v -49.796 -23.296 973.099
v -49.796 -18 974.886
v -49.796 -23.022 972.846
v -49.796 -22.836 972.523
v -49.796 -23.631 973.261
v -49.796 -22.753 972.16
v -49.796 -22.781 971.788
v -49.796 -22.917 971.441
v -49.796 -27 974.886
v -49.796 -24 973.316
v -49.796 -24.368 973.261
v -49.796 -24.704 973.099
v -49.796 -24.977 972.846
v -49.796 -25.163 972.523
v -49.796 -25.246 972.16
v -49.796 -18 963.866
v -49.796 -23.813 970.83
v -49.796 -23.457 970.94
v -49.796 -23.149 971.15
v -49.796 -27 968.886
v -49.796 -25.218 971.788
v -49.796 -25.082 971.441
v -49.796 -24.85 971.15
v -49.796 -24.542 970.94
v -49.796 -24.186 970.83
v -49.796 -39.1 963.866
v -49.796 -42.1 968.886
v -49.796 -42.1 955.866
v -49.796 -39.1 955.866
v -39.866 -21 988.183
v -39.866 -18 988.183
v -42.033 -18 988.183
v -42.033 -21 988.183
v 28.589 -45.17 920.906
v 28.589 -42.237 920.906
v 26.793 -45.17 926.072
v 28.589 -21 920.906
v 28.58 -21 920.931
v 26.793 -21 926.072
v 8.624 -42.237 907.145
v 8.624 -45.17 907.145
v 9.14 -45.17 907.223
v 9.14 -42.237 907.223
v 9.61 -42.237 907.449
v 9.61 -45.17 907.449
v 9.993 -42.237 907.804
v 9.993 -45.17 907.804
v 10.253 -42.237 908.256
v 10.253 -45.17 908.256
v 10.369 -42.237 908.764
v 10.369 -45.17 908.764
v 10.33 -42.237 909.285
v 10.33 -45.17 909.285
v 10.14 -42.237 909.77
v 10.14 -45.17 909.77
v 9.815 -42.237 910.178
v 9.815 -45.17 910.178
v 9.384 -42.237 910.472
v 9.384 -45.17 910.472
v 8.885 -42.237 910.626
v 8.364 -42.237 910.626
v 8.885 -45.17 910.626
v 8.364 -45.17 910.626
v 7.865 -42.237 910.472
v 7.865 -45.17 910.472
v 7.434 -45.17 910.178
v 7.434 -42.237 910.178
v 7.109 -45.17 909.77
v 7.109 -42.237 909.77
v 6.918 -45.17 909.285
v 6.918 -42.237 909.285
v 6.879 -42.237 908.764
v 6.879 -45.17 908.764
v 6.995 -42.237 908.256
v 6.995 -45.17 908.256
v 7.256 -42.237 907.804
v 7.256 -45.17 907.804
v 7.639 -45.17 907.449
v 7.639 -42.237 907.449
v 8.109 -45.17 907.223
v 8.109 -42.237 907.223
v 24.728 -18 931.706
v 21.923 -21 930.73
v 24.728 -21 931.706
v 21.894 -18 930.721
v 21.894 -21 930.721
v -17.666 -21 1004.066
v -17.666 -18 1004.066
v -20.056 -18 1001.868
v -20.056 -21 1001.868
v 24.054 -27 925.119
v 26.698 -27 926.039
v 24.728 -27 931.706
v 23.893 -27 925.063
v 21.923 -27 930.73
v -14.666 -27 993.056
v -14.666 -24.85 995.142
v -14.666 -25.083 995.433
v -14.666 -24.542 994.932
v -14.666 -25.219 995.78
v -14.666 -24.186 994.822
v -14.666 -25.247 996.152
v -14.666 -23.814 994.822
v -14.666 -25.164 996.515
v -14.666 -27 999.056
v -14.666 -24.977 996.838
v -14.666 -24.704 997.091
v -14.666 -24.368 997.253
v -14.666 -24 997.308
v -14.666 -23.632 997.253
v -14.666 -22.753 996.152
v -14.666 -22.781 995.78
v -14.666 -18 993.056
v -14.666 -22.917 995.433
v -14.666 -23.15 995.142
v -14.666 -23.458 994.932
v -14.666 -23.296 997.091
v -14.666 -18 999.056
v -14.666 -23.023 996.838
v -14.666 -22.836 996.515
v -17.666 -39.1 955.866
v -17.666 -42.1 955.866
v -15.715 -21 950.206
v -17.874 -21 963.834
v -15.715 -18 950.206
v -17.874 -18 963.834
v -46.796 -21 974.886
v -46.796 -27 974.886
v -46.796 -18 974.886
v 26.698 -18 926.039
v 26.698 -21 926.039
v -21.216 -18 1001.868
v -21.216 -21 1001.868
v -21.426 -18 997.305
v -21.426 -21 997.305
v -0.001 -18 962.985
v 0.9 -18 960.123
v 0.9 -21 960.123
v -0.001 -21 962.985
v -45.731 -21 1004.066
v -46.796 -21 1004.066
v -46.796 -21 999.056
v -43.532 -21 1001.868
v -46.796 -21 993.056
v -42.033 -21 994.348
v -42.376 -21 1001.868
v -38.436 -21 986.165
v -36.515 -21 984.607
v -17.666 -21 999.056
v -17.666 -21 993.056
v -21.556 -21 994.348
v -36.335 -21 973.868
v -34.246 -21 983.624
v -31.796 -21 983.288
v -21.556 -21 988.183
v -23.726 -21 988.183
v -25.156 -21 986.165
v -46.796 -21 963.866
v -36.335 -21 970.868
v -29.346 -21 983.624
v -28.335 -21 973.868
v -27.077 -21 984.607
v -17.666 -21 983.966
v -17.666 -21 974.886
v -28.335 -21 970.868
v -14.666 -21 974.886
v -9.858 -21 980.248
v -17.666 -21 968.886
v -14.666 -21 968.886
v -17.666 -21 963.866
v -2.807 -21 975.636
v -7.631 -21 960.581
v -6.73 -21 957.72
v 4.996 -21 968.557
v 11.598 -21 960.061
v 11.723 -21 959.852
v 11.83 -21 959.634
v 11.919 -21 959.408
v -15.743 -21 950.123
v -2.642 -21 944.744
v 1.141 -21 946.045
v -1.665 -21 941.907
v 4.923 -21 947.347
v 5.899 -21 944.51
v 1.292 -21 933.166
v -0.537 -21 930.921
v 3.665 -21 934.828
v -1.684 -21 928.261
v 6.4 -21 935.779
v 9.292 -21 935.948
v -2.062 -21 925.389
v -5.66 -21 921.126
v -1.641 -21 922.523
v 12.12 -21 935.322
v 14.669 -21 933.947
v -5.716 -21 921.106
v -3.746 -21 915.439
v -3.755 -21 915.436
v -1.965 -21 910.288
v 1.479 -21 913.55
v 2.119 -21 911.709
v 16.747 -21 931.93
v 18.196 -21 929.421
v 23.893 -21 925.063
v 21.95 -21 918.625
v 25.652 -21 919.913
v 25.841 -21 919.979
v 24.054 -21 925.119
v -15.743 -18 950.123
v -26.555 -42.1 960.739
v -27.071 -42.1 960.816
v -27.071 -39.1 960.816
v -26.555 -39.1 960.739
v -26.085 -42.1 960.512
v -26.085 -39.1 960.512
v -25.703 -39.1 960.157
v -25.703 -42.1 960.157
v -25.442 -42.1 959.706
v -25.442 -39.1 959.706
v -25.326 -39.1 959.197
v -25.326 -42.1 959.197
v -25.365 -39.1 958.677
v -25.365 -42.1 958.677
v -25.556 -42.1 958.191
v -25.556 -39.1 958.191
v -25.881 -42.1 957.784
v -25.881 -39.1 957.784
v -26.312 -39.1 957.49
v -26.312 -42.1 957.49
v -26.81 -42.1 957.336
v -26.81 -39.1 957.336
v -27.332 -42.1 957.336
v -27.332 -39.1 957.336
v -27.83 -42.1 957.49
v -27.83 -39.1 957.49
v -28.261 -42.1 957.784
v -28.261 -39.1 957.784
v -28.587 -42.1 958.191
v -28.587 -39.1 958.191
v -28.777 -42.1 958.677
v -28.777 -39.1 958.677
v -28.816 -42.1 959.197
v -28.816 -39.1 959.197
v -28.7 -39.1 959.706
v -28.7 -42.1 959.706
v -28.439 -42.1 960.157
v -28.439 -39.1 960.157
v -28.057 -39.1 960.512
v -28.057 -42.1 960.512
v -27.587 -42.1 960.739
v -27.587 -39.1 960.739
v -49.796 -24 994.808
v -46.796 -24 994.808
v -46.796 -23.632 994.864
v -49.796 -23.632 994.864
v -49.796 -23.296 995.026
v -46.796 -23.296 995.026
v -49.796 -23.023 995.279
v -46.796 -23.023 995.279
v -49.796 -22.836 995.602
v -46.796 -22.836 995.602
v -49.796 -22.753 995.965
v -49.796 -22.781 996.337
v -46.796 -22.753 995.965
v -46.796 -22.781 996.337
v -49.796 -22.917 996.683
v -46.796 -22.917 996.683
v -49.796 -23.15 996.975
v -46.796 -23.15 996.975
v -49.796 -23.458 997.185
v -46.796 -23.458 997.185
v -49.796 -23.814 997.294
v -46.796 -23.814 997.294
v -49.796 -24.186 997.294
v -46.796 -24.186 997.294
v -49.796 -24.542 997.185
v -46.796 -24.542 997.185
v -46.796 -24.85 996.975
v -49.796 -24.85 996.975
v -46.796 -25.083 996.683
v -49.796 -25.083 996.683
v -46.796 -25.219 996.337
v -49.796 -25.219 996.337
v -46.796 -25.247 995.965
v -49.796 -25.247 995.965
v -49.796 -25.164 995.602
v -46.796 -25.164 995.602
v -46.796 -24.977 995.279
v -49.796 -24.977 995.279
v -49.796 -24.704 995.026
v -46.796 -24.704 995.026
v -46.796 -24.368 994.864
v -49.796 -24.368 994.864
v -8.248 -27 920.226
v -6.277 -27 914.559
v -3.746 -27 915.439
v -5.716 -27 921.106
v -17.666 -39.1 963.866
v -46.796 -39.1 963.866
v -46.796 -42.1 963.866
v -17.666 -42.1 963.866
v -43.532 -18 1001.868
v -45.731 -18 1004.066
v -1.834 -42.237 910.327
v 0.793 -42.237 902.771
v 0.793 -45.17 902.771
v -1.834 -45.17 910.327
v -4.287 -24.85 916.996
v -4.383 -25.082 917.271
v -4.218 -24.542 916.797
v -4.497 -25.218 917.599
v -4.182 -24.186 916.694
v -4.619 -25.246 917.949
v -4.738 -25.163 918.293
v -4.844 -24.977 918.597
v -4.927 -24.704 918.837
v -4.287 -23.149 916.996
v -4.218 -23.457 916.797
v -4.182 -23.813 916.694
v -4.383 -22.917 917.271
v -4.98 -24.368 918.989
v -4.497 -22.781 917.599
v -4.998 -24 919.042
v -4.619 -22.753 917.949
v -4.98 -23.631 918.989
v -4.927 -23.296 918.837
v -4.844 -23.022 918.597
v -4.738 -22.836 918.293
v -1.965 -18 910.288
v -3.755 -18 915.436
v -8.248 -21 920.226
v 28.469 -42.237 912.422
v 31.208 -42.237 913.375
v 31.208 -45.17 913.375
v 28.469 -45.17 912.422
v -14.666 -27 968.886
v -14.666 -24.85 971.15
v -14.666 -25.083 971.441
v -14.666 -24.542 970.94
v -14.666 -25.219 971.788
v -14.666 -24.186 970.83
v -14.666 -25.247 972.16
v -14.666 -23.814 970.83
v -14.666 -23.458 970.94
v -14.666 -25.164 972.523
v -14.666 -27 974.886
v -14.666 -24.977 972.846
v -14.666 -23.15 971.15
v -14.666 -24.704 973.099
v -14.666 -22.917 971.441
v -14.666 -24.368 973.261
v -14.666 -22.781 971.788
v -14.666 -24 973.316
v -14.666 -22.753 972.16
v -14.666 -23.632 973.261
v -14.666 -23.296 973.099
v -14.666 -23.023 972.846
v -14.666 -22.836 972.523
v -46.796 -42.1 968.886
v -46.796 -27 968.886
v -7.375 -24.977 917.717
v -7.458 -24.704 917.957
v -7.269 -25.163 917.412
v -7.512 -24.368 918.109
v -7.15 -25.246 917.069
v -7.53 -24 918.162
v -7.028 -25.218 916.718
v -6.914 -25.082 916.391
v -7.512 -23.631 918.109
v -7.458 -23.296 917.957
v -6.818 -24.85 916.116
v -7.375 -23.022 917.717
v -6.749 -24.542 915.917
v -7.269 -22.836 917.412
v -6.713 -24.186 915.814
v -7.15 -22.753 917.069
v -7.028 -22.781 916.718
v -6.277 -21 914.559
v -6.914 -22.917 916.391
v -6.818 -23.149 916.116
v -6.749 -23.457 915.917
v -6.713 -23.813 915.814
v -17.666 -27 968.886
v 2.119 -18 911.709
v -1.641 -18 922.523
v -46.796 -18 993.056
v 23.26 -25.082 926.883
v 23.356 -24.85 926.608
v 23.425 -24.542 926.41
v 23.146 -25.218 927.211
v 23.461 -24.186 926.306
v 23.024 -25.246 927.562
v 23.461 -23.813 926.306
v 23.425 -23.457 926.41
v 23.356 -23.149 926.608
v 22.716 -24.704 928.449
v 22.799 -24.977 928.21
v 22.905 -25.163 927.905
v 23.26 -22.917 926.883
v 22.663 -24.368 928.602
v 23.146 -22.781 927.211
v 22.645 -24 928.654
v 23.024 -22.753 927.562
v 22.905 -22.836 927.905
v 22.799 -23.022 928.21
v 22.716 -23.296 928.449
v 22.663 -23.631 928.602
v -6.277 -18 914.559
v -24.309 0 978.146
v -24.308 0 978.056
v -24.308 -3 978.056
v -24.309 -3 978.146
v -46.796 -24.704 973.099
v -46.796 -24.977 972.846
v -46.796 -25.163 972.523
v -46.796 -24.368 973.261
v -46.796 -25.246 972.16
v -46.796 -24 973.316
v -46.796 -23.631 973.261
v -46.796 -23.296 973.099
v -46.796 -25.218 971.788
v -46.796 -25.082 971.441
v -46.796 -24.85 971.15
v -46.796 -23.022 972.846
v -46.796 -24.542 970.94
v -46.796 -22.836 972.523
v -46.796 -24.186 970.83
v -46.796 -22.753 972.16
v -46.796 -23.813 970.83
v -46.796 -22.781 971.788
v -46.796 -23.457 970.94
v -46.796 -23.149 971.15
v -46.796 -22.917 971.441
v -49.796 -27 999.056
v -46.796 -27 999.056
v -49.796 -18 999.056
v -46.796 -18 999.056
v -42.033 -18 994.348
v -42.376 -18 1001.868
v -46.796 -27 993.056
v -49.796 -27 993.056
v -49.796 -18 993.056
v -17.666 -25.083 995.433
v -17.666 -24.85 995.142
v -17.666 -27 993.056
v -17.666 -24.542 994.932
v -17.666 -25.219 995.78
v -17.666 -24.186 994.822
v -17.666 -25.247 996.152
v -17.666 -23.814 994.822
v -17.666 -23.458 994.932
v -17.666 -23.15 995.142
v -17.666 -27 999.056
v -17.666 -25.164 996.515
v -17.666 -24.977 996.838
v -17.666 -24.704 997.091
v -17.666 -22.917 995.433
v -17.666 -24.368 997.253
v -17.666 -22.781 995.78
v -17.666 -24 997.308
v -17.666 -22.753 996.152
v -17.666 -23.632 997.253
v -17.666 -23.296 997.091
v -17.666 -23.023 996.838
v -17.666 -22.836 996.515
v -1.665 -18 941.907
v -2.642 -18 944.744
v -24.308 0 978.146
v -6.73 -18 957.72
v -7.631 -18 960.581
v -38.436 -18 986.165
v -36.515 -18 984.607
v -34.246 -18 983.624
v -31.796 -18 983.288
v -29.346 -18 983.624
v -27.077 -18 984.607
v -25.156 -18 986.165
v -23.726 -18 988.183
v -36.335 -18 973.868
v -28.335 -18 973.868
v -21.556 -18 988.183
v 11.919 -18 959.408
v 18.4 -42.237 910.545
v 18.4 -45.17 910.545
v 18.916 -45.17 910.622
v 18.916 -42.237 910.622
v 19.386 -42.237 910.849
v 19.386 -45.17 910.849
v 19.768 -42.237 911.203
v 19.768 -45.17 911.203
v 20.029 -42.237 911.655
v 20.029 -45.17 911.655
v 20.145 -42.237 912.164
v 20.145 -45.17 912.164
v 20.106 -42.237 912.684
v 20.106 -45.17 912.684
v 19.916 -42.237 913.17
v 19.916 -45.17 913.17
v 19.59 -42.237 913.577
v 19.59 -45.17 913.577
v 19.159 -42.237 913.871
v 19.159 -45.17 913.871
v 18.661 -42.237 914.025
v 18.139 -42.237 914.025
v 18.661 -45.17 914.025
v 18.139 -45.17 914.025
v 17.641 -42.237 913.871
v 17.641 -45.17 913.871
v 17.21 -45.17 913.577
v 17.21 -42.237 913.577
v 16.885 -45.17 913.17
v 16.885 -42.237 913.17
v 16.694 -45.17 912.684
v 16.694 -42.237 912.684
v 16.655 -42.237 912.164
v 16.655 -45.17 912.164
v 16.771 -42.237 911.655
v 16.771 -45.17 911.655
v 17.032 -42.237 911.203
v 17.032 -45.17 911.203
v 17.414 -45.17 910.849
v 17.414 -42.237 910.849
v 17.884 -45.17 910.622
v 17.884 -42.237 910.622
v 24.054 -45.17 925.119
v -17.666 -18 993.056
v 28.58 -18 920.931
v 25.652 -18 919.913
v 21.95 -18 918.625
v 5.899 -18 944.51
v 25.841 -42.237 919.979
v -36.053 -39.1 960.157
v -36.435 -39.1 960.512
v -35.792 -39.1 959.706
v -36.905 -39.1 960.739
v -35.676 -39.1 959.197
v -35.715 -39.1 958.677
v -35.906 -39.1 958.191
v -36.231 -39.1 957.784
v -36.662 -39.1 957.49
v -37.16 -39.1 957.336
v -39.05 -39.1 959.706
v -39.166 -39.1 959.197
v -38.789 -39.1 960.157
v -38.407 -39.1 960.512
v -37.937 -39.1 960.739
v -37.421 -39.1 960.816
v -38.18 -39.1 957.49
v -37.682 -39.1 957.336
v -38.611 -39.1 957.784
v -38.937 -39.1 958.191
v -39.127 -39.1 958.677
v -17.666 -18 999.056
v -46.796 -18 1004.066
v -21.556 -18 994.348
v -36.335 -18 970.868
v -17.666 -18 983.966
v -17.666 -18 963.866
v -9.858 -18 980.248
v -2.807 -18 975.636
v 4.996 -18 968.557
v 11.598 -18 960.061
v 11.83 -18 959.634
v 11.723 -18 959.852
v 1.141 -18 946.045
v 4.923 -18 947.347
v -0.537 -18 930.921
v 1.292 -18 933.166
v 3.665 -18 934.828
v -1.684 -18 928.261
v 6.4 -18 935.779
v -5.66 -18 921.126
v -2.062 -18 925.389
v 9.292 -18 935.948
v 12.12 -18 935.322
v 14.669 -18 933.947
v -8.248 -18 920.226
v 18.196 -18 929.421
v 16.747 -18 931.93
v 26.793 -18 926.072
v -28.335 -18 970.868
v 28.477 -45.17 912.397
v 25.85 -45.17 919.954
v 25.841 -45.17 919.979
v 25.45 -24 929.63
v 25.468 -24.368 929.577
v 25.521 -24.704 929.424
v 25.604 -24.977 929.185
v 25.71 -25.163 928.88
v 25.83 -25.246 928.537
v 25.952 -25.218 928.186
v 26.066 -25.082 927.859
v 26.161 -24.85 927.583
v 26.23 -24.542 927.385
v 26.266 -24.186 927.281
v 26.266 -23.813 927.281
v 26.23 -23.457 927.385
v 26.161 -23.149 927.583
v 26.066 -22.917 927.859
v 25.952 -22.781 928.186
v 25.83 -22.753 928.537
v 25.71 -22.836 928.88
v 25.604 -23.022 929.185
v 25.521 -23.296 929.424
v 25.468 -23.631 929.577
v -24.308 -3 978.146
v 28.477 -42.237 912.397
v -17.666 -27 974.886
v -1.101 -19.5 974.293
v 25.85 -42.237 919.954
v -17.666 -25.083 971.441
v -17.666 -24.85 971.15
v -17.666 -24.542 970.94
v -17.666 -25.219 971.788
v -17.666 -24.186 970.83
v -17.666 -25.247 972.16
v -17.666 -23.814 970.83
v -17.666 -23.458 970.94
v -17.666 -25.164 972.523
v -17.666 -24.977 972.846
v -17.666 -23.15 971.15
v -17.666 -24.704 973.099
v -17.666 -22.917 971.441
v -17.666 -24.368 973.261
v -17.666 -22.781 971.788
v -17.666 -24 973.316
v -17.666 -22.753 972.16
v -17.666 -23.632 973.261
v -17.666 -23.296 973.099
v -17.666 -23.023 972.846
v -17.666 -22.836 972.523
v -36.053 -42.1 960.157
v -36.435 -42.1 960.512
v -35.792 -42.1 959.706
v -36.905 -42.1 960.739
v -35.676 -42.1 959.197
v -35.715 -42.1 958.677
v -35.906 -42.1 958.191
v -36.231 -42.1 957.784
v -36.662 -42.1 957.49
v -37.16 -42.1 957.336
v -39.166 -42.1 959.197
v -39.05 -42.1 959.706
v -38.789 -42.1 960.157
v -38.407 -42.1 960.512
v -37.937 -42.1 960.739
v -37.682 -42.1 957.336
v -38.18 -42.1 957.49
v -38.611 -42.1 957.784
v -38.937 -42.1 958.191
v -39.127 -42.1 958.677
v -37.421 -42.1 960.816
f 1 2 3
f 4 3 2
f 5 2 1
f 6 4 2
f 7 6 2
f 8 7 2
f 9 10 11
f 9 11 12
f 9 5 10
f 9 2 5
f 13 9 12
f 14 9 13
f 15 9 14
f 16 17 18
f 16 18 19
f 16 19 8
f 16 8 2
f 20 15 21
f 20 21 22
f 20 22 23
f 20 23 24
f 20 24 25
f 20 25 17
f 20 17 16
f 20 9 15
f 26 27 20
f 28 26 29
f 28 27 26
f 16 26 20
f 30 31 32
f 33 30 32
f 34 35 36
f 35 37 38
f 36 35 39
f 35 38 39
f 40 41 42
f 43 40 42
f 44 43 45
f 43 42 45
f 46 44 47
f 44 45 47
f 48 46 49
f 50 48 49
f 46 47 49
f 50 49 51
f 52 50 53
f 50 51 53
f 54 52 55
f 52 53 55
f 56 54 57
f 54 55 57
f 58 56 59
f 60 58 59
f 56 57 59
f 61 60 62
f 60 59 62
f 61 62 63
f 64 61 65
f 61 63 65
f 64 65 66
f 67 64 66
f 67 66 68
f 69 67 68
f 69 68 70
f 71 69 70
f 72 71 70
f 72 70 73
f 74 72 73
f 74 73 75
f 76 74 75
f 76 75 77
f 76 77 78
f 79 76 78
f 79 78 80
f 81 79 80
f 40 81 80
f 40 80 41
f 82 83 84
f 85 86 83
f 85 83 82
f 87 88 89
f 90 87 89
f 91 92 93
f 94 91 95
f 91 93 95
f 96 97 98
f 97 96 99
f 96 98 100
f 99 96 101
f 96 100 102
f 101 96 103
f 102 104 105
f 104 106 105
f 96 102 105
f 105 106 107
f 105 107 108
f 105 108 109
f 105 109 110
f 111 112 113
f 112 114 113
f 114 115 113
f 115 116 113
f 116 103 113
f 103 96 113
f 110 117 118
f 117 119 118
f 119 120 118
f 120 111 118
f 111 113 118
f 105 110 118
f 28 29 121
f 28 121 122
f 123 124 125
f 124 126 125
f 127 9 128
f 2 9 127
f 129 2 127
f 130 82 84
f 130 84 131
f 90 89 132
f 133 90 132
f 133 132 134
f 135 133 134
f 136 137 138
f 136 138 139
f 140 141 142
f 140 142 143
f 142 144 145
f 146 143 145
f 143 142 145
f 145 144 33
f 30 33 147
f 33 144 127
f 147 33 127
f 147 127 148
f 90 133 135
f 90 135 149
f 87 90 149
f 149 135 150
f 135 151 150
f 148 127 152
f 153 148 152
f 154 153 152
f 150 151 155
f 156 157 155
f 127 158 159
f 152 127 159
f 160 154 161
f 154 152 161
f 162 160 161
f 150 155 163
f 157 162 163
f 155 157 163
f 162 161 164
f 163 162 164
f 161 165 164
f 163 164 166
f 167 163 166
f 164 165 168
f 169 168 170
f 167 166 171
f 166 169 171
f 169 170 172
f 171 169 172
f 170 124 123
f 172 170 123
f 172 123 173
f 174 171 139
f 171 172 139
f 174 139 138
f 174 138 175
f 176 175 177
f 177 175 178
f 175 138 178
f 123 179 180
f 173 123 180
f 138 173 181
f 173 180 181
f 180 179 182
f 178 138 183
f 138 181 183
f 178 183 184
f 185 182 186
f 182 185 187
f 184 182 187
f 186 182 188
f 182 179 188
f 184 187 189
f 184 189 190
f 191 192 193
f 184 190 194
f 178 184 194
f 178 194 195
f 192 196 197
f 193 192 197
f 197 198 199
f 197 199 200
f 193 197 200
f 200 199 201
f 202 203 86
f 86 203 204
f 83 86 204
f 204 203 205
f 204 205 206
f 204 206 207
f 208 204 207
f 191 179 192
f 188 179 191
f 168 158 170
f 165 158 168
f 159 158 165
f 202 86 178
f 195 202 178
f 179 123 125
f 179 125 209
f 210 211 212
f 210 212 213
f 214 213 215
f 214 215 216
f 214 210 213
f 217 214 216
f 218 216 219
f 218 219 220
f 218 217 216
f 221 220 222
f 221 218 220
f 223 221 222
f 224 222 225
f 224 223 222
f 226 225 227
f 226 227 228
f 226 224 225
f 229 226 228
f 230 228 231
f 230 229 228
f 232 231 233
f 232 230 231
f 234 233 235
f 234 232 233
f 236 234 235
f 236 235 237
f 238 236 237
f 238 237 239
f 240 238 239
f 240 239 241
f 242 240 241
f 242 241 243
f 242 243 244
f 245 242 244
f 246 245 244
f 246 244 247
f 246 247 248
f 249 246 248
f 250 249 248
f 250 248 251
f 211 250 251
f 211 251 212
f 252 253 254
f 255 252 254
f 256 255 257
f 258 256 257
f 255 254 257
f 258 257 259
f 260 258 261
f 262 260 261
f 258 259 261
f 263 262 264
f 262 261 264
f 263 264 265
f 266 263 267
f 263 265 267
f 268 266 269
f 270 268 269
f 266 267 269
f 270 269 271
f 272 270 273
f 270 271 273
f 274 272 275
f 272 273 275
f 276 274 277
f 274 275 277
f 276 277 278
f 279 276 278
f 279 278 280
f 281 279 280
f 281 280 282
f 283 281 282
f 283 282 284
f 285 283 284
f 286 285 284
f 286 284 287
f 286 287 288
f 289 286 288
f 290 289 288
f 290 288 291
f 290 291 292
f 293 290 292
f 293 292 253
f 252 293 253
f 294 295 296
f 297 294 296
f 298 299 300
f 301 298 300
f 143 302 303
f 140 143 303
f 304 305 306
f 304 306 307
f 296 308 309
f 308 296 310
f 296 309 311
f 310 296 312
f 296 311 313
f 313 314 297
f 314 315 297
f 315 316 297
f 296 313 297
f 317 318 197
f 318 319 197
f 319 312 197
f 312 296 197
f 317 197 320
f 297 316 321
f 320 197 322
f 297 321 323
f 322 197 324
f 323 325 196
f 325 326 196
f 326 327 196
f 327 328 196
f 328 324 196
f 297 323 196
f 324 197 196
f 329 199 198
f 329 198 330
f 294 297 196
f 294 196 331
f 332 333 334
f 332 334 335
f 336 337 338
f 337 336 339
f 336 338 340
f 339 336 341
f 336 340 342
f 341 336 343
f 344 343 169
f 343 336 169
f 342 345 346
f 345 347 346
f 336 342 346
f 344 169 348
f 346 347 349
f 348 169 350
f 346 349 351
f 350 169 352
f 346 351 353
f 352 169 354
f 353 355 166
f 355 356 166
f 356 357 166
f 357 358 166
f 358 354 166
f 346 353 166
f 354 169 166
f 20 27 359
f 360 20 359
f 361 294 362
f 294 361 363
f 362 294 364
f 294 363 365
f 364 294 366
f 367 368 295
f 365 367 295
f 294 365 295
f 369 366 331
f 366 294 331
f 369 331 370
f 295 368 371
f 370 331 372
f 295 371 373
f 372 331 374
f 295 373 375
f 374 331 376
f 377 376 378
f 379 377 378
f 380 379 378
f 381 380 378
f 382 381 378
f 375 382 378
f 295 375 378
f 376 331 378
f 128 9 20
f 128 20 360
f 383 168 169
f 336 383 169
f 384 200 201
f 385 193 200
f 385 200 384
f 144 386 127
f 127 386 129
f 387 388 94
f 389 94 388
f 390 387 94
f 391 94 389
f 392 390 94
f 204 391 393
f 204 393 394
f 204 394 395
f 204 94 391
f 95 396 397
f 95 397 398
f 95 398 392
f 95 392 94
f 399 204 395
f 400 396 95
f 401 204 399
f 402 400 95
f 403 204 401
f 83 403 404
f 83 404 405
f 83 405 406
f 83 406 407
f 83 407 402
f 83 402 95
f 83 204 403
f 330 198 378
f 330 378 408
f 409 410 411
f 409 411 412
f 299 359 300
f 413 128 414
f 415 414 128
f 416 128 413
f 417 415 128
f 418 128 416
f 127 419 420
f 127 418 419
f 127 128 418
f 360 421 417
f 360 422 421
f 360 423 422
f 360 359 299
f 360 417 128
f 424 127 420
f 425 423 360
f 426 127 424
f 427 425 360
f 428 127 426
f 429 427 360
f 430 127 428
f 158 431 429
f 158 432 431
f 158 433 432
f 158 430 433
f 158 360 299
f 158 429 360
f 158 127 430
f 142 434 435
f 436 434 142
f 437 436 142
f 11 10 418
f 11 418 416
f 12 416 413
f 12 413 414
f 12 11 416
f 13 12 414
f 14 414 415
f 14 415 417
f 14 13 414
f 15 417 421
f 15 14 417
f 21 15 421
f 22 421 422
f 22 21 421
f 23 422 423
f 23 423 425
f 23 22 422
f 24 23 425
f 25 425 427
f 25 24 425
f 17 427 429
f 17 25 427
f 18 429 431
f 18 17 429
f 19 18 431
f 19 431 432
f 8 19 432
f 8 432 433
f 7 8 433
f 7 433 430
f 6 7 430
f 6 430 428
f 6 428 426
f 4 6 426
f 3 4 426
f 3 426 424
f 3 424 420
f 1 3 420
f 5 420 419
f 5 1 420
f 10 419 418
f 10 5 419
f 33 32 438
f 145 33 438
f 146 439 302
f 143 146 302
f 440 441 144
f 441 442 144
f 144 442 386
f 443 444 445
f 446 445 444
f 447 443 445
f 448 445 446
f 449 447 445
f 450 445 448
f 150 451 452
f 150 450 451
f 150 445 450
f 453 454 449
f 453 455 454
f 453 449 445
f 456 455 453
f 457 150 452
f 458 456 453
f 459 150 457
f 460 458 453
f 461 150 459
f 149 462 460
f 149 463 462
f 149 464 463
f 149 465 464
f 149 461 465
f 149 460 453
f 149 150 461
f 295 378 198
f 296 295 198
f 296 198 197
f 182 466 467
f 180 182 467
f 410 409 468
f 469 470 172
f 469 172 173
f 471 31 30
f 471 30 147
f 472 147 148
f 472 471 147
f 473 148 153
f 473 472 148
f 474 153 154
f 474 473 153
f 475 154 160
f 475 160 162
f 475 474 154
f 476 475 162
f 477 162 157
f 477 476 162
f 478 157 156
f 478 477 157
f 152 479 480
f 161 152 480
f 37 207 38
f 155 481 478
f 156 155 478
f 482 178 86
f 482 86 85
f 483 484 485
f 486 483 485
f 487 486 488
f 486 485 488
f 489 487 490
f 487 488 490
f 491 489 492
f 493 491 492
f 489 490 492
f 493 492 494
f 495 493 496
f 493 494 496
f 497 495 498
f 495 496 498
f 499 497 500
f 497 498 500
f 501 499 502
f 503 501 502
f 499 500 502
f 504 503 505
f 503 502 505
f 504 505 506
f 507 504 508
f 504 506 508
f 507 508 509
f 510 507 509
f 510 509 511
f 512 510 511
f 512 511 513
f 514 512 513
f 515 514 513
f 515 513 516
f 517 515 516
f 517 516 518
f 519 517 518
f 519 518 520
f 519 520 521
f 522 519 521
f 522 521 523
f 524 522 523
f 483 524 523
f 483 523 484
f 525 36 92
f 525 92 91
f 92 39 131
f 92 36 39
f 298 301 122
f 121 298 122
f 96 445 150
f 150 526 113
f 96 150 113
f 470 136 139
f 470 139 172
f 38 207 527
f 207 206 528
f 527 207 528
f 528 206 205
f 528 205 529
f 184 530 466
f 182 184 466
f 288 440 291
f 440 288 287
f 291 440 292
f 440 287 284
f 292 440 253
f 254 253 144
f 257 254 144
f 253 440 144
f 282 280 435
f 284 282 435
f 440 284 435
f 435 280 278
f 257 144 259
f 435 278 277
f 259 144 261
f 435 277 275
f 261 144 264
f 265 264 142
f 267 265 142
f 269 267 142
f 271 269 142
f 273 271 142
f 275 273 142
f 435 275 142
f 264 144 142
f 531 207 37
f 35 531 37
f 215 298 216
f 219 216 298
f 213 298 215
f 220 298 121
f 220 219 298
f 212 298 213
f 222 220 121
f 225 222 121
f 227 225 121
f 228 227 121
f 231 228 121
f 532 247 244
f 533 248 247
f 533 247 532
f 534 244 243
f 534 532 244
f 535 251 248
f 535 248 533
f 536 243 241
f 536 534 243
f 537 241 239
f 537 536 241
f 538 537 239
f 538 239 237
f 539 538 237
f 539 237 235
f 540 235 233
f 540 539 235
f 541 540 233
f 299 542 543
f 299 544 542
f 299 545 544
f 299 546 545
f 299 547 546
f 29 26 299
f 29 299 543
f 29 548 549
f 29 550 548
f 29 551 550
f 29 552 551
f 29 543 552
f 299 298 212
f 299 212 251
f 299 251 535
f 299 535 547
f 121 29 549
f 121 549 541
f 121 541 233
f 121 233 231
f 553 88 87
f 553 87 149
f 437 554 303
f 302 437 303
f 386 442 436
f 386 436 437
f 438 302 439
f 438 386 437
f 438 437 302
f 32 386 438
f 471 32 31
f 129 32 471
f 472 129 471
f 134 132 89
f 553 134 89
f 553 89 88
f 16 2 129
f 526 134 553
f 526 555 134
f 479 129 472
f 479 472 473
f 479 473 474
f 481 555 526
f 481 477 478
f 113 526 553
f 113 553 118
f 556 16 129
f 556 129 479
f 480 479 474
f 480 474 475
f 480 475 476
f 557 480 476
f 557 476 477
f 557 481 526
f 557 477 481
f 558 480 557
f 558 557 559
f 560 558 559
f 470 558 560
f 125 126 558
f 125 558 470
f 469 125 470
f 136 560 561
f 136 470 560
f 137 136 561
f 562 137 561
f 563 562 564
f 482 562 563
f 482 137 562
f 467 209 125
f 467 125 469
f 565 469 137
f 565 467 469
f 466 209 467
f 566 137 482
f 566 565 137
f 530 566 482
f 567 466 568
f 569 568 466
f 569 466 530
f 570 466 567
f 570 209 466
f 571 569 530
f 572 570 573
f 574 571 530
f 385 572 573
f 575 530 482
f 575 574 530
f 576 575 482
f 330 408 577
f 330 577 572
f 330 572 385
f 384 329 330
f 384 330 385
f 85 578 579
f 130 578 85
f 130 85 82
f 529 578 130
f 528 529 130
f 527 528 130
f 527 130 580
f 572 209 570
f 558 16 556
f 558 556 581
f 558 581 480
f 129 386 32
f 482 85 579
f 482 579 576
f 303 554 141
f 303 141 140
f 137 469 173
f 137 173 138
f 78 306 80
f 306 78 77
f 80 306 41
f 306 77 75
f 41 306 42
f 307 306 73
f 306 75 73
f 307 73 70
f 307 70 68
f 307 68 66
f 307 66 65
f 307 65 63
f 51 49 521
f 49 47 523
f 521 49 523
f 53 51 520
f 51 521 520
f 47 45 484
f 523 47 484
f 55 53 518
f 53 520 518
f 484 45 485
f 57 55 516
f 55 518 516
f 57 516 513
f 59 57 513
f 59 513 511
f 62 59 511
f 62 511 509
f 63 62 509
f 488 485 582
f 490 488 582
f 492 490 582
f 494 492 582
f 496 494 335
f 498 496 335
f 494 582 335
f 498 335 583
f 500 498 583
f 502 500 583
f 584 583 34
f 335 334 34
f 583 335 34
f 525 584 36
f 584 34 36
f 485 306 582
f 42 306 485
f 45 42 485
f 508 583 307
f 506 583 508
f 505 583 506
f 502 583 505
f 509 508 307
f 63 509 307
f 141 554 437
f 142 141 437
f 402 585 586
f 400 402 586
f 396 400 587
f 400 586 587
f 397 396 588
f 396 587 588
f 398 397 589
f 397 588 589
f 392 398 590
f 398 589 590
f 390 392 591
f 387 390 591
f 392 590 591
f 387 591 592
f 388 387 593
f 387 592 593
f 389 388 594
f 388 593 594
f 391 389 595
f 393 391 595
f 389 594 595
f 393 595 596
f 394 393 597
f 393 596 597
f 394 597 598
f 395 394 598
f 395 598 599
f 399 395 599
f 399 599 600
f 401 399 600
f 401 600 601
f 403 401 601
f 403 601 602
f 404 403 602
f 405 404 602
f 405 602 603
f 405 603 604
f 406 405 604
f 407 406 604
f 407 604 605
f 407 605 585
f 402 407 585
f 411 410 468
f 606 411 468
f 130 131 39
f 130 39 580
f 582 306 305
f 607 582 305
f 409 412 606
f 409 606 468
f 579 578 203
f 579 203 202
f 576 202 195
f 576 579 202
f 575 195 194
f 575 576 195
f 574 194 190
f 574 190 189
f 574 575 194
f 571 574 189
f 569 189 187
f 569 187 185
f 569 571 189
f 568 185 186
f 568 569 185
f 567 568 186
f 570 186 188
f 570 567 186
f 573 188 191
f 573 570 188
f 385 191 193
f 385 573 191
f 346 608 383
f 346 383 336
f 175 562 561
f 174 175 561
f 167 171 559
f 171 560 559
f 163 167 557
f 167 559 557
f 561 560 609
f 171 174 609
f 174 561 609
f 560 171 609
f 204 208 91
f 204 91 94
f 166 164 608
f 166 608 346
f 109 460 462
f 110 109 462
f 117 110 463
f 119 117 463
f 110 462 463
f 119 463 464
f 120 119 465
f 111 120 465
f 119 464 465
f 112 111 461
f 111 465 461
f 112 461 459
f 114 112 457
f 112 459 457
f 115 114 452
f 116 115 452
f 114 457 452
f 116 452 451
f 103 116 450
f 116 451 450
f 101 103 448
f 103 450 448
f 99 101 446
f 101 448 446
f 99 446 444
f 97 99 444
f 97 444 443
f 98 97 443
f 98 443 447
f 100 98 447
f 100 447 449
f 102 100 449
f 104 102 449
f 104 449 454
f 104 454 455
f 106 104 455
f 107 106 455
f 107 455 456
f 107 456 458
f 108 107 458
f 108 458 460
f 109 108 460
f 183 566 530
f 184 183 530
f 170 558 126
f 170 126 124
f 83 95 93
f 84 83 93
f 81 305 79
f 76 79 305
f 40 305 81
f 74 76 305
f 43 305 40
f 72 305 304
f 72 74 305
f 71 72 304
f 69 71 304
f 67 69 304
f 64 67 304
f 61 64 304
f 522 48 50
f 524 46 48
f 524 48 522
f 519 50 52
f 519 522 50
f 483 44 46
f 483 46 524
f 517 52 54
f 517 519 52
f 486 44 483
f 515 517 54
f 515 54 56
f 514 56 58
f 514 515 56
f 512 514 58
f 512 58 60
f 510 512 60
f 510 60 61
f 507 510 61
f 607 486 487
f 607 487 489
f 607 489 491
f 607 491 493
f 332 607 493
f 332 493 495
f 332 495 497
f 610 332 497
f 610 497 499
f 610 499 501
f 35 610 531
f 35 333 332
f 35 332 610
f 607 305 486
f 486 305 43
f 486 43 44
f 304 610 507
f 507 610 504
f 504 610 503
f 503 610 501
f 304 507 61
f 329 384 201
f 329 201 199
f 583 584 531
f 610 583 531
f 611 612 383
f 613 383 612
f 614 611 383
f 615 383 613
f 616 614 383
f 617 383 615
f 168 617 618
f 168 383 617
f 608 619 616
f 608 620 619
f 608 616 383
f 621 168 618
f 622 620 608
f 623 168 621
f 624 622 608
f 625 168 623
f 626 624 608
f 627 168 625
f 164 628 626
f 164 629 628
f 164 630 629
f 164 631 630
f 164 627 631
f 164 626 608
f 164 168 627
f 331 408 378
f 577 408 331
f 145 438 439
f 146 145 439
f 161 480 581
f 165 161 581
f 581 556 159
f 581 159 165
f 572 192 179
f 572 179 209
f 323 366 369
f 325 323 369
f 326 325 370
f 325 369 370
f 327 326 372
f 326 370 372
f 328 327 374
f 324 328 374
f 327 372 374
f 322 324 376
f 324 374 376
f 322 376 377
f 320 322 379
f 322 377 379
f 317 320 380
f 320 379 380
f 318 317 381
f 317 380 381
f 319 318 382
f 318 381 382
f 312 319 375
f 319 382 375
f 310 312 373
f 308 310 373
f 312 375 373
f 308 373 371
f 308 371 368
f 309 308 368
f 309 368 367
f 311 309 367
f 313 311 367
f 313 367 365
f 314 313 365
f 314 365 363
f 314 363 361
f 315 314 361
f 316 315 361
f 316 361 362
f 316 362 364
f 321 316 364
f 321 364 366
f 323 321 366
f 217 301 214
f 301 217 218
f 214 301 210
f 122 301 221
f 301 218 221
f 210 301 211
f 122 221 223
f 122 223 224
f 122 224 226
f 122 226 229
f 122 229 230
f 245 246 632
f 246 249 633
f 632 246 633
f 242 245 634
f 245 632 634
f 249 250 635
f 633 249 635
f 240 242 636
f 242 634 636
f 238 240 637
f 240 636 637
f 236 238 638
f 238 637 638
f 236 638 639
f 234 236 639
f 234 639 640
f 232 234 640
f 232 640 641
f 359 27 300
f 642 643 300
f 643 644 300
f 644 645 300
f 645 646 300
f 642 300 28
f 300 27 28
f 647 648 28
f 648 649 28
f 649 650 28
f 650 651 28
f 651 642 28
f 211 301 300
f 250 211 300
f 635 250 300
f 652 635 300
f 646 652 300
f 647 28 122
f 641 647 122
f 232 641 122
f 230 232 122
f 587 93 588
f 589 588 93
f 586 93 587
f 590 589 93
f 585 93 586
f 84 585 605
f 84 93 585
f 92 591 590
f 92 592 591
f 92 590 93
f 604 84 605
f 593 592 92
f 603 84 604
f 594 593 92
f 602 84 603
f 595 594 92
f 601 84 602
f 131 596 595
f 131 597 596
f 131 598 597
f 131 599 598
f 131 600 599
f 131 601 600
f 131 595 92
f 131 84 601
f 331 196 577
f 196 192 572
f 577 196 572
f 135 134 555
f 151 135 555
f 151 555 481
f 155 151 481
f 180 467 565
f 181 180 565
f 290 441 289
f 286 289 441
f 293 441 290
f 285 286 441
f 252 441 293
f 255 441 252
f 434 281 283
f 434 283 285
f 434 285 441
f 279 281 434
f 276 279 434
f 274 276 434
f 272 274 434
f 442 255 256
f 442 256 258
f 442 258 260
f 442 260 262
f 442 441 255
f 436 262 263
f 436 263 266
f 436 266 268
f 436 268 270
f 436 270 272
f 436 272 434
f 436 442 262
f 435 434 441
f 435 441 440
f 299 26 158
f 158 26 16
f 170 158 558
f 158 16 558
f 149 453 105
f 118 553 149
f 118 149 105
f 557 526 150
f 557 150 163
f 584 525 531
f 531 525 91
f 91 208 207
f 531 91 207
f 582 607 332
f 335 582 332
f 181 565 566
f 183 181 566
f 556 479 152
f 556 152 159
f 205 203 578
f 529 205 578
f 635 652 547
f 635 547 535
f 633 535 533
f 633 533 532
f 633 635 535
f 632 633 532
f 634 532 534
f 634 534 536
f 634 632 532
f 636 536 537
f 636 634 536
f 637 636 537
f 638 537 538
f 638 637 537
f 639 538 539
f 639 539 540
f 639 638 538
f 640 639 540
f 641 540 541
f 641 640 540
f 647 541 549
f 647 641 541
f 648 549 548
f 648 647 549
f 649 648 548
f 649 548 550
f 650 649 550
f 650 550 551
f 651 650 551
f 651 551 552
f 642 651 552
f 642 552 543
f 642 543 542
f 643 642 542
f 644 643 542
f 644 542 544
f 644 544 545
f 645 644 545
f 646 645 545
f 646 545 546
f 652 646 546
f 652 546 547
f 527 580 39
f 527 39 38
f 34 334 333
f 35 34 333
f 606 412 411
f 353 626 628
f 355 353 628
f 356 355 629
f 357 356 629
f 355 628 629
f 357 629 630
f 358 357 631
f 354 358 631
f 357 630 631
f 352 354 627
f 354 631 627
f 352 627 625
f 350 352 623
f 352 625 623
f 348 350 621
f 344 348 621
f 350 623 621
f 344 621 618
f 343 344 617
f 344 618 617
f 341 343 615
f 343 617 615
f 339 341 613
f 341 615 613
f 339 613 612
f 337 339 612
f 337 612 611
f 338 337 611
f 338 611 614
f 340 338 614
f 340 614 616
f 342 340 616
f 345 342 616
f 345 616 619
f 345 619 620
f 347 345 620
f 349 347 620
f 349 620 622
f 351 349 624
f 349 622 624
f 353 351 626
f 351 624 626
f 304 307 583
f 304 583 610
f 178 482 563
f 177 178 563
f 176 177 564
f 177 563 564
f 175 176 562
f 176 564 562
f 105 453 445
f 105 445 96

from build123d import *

# Parameters (mm, degrees)
SKETCH1_W                 = 29.13
SKETCH1_H                 = 40.2
BOSS_EXTRUDE1_DEPTH       = 3
SKETCH3_W                 = 6
SKETCH3_H                 = 3
BOSS_EXTRUDE2_DEPTH       = 3
SKETCH4_W                 = 3
SKETCH4_H                 = 6
BOSS_EXTRUDE3_DEPTH       = 6
SKETCH6_W                 = 6
SKETCH6_H                 = 3
BOSS_EXTRUDE4_DEPTH       = 2
SKETCH7_W                 = 3.000000005
SKETCH7_H                 = 6
BOSS_EXTRUDE6_DEPTH       = 6
SKETCH9_R                 = 1.25
CUT_EXTRUDE1_DEPTH        = 3
SKETCH8_R                 = 1.250000001
CUT_EXTRUDE2_DEPTH        = 3
SKETCH11_W                = 6
SKETCH11_H                = 3
BOSS_EXTRUDE7_DEPTH       = 3
SKETCH19_W                = 3
SKETCH19_H                = 6
BOSS_EXTRUDE11_DEPTH      = 6
SKETCH21_W                = 6
SKETCH21_H                = 3
BOSS_EXTRUDE12_DEPTH      = 3
SKETCH22_W                = 3
SKETCH22_H                = 6
BOSS_EXTRUDE13_DEPTH      = 6
SKETCH24_R                = 1.25
CUT_EXTRUDE5_DEPTH        = 4
SKETCH23_R                = 1.25
CUT_EXTRUDE6_DEPTH        = 4
CUT_EXTRUDE8_DEPTH        = 4
CUT_EXTRUDE11_DEPTH       = 4
SKETCH30_W                = 25.92
SKETCH30_H                = 3
CUT_EXTRUDE12_DEPTH       = 15
SKETCH33_W                = 29.17650364
SKETCH33_H                = 3
BOSS_EXTRUDE14_DEPTH      = 40.3
SKETCH34_W                = 21.00258235
SKETCH34_H                = 3
CUT_EXTRUDE15_DEPTH       = 25
CUT_EXTRUDE16_DEPTH       = 5
SKETCH37_W                = 4.5
SKETCH37_H                = 3
SKETCH37_W_2              = 1.5
BOSS_EXTRUDE15_DEPTH      = 3
BOSS_EXTRUDE16_DEPTH      = 6
SKETCH41_W                = 6
SKETCH41_H                = 3
BOSS_EXTRUDE17_DEPTH      = 3
BOSS_EXTRUDE18_DEPTH      = 6
SKETCH46_W                = 5.02
SKETCH46_H                = 3
BOSS_EXTRUDE19_DEPTH      = 3
SKETCH48_W                = 3
SKETCH48_H                = 5.02
BOSS_EXTRUDE20_DEPTH      = 21.1
BOSS_EXTRUDE22_DEPTH      = 29.13
BOSS_EXTRUDE22_DEPTH_BACK = 3
SKETCH50_W                = 8
SKETCH50_H                = 3
SKETCH51_R                = 1.75
CUT_EXTRUDE21_DEPTH       = 5
SKETCH56_W                = 3.994197227
SKETCH56_H                = 3.994197227
CUT_EXTRUDE26_DEPTH       = 0.1
FILLET4_START             = -19
FILLET4_DEPTH             = 5
BOSS_EXTRUDE28_DEPTH      = 0.21
BOSS_EXTRUDE29_DEPTH      = 3
BOSS_EXTRUDE30_DEPTH      = 1.95
BOSS_EXTRUDE30_DEPTH_BACK = 4
SKETCH68_W                = 4.32399603
SKETCH68_H                = 3
SKETCH69_W                = 3.919724064
SKETCH69_H                = 3
BOSS_EXTRUDE31_DEPTH      = 1.83
SKETCH70_W                = 5.44243662
SKETCH70_H                = 3
BOSS_EXTRUDE32_DEPTH      = 3.1
BOSS_EXTRUDE33_DEPTH      = 24.17
SKETCH72_W                = 2.9
SKETCH72_H                = 2.93342148
BOSS_EXTRUDE34_DEPTH      = 8
SKETCH73_W                = 8
SKETCH73_H                = 2.93342148
BOSS_EXTRUDE35_DEPTH      = 29.31
SKETCH74_R                = 1.75
CUT_EXTRUDE27_DEPTH       = 5
SKETCH75_R                = 1.25
CUT_EXTRUDE28_DEPTH       = 5
SKETCH76_R                = 1.25
CUT_EXTRUDE29_DEPTH       = 5
BOSS_EXTRUDE36_DEPTH      = 3
BOSS_EXTRUDE37_DEPTH      = 3
SKETCH79_W                = 8
SKETCH79_H                = 3
CUT_EXTRUDE30_DEPTH       = 10
CUT_EXTRUDE31_DEPTH       = 10


with BuildPart() as part:
    # Sketch1 → Boss-Extrude1 (new body)
    with BuildSketch(Plane(origin=(0, 0, 0), x_dir=(1, 0, 0), z_dir=(0, 1, 0))):
        with Locations((-32.231128585, -983.966354464)):
            Rectangle(SKETCH1_W, SKETCH1_H)
        with BuildLine():
            Line((-15.507778999, -950.239071497), (-17.666128585, -963.866354464))
            Line((-17.666128585, -963.866354464), (-17.666128585, -983.966354464))
            add(Edge.make_bspline(
                [(11.825950039, -959.709415703), (1.028086592, -976.494542347), (-17.666128585, -983.966354464)],
                knots=[0, 0, 0, 1, 1, 1], degree=2))
            Line((11.825950039, -959.709415703), (-15.497121464, -950.208422428))
            Line((-15.497121464, -950.208422428), (-15.507778999, -950.239071497))
        make_face()
    extrude(amount=-BOSS_EXTRUDE1_DEPTH)

    # Sketch3 → Boss-Extrude2 (add)
    with BuildSketch(Plane.ZY.offset(46.796128585)):
        with Locations((971.886354464, -1.5)):
            Rectangle(SKETCH3_W, SKETCH3_H)
    extrude(amount=BOSS_EXTRUDE2_DEPTH)

    # Sketch4 → Boss-Extrude3 (add)
    with BuildSketch(Plane.XZ.offset(3)):
        with Locations((-48.296128585, 971.886354464)):
            Rectangle(SKETCH4_W, SKETCH4_H)
    extrude(amount=BOSS_EXTRUDE3_DEPTH)

    # Sketch6 → Boss-Extrude4 (add)
    with BuildSketch(Plane(origin=(-17.666128585, 0, 0), x_dir=(0, 0, -1), z_dir=(1, 0, 0))):
        with Locations((-971.886354464, -1.5)):
            Rectangle(SKETCH6_W, SKETCH6_H)
    extrude(amount=BOSS_EXTRUDE4_DEPTH)

    # Sketch7 → Boss-Extrude6 (add)
    with BuildSketch(Plane.XZ.offset(3)):
        with Locations((-16.166128583, 971.886354464)):
            Rectangle(SKETCH7_W, SKETCH7_H)
    extrude(amount=BOSS_EXTRUDE6_DEPTH)

    # Sketch9 → Cut-Extrude1 (cut)
    with BuildSketch(Plane.ZY.offset(17.666128585)):
        with Locations((972.066354464, -6)):
            Circle(SKETCH9_R)
    extrude(amount=-CUT_EXTRUDE1_DEPTH, mode=Mode.SUBTRACT)

    # Sketch8 → Cut-Extrude2 (cut)
    with BuildSketch(Plane(origin=(-49.796128585, 0, 0), x_dir=(0, 0, -1), z_dir=(1, 0, 0))):
        with Locations(Location((-972.066168305, -5.999675203, 0), (0, 0, 180))):
            Circle(SKETCH8_R)
    extrude(amount=CUT_EXTRUDE2_DEPTH, mode=Mode.SUBTRACT)

    # Sketch11 → Boss-Extrude7 (add)
    with BuildSketch(Plane.ZY.offset(46.796128585)):
        with Locations((996.056354464, -1.5)):
            Rectangle(SKETCH11_W, SKETCH11_H)
    extrude(amount=BOSS_EXTRUDE7_DEPTH)

    # Sketch19 → Boss-Extrude11 (add)
    with BuildSketch(Plane.XZ.offset(3)):
        with Locations((-48.296128585, 996.056354464)):
            Rectangle(SKETCH19_W, SKETCH19_H)
    extrude(amount=BOSS_EXTRUDE11_DEPTH)

    # Sketch21 → Boss-Extrude12 (add)
    with BuildSketch(Plane(origin=(-17.666128585, 0, 0), x_dir=(0, 0, -1), z_dir=(1, 0, 0))):
        with Locations((-996.056354464, -1.5)):
            Rectangle(SKETCH21_W, SKETCH21_H)
    extrude(amount=BOSS_EXTRUDE12_DEPTH)

    # Sketch22 → Boss-Extrude13 (add)
    with BuildSketch(Plane.XZ.offset(3)):
        with Locations((-16.166128585, 996.056354464)):
            Rectangle(SKETCH22_W, SKETCH22_H)
    extrude(amount=BOSS_EXTRUDE13_DEPTH)

    # Sketch24 → Cut-Extrude5 (cut)
    with BuildSketch(Plane(origin=(-46.796128585, 0, 0), x_dir=(0, 0, -1), z_dir=(1, 0, 0))):
        with Locations((-996.058375158, -6)):
            Circle(SKETCH24_R)
    extrude(amount=-CUT_EXTRUDE5_DEPTH, mode=Mode.SUBTRACT)

    # Sketch23 → Cut-Extrude6 (cut)
    with BuildSketch(Plane.ZY.offset(17.666128585)):
        with Locations((996.058154464, -6)):
            Circle(SKETCH23_R)
    extrude(amount=-CUT_EXTRUDE6_DEPTH, mode=Mode.SUBTRACT)

    # Sketch28 → Cut-Extrude8 (cut)
    with BuildSketch(Plane(origin=(0, 0, 0), x_dir=(1, 0, 0), z_dir=(0, 1, 0))):
        Polygon((-39.266128585, -975.05646378), (-24.308019321, -978.056409122), (-24.326128585, -981.056354464), (-39.266128585, -978.146354464), align=None)
    extrude(amount=-CUT_EXTRUDE8_DEPTH, mode=Mode.SUBTRACT)

    # Sketch29 → Cut-Extrude11 (cut)
    with BuildSketch(Plane(origin=(0, 0, 0), x_dir=(1, 0, 0), z_dir=(0, 1, 0))):
        Polygon((-39.266128585, -975.05646378), (-39.865804676, -988.183184315), (-42.032837695, -988.183184315), (-42.032837695, -994.347976596), (-42.376382193, -1001.868057312), (-43.532474114, -1001.868057312), (-45.730771266, -1004.066354464), (-39.266128585, -1004.066354464), (-39.266128585, -988.183184315), align=None)
        Polygon((-24.308019321, -978.056409122), (-24.326128585, -1004.066354464), (-17.666128585, -1004.066354464), (-20.056128585, -1001.868057312), (-21.216128585, -1001.868057312), (-21.426128585, -997.305136389), (-21.556128585, -994.347976596), (-21.556128585, -988.183184315), (-23.726128585, -988.183184315), align=None)
    extrude(amount=-CUT_EXTRUDE11_DEPTH, mode=Mode.SUBTRACT)


with BuildPart() as cut_extrude11_piece_1:
    # of the separate pieces the step leaves, piece 1, a body of its own (cut_extrude11_pieces)
    add(part.part.solids().sort_by_distance((-17.666128585, 0, 983.966354464))[0])


with BuildPart() as cut_extrude11_piece_2:
    # of the separate pieces the step leaves, piece 2, a body of its own (cut_extrude11_pieces)
    add(part.part.solids().sort_by_distance((-24.326128585, 0, 1004.066354464))[0])


with BuildPart() as cut_extrude12_tool:
    # Sketch30 → Cut-Extrude12 (new body)
    with BuildSketch(Plane.ZY.offset(39.266128585)):
        with Locations((991.106354464, -1.5)):
            Rectangle(SKETCH30_W, SKETCH30_H)
    extrude(amount=-CUT_EXTRUDE12_DEPTH)


with BuildPart() as cut_extrude11_piece_1_1:
    add(cut_extrude11_piece_1.part)

    # Cut-Extrude12: cut by cut_extrude12_tool
    add(cut_extrude12_tool.part, mode=Mode.SUBTRACT)

    # Sketch33 → Boss-Extrude14 (add)
    with BuildSketch(Plane(origin=(-296.443416752, 0, 852.515567448), x_dir=(-0.9445255798324886, 0, -0.32843786176703366), z_dir=(0.3284378617670337, 0, -0.9445255798324887))):
        with Locations((-311.77524668, -1.5)):
            Rectangle(SKETCH33_W, SKETCH33_H)
    extrude(amount=BOSS_EXTRUDE14_DEPTH)

    # Sketch34 → Cut-Extrude15 (cut)
    with BuildSketch(Plane(origin=(-283.207370923, 0, 814.451186581), x_dir=(-0.9445255798324887, 0, -0.32843786176703327), z_dir=(0.32843786176703327, 0, -0.9445255798324887))):
        with Locations((-311.942483261, -1.5)):
            Rectangle(SKETCH34_W, SKETCH34_H)
    extrude(amount=-CUT_EXTRUDE15_DEPTH, mode=Mode.SUBTRACT)

    # Sketch35 → Cut-Extrude16 (cut)
    with BuildSketch(Plane(origin=(0, 0, 0), x_dir=(1, 0, 0), z_dir=(0, 1, 0))):
        Polygon((-6.699400727, -937.069026653), (11.67040627, -948.187810964), (13.138075545, -943.967069892), align=None)
    extrude(amount=-CUT_EXTRUDE16_DEPTH, mode=Mode.SUBTRACT)

    # Sketch37 → Boss-Extrude15 (add)
    with BuildSketch(Plane(origin=(280.946295288, 0, 97.69285498), x_dir=(-0.32843786176743117, 0, 0.9445255798323505), z_dir=(-0.9445255798323505, 0, -0.32843786176743117))):
        with Locations((868.136002588, -1.5)):
            Rectangle(SKETCH37_W, SKETCH37_H)
        with Locations((871.136002588, -1.5)):
            Rectangle(SKETCH37_W_2, SKETCH37_H)
    extrude(amount=BOSS_EXTRUDE15_DEPTH)

    # Sketch39 → Boss-Extrude16 (add)
    with BuildSketch(Plane.XZ.offset(3)):
        Polygon((-6.277028676, 914.559020058), (-3.745700122, 915.439233528), (-5.716327292, 921.106387007), (-8.247655846, 920.226173537), align=None)
    extrude(amount=BOSS_EXTRUDE16_DEPTH)

    # Sketch41 → Boss-Extrude17 (add)
    with BuildSketch(Plane(origin=(308.258672657, 0, 107.190129606), x_dir=(0.3284378617670337, 0, -0.9445255798324887), z_dir=(0.9445255798324887, 0, 0.3284378617670337))):
        with Locations((-868.898439213, -1.5)):
            Rectangle(SKETCH41_W, SKETCH41_H)
    extrude(amount=BOSS_EXTRUDE17_DEPTH)

    # Sketch42 → Boss-Extrude18 (add)
    with BuildSketch(Plane.XZ.offset(3)):
        Polygon((23.893176542, 925.063208116), (21.922549371, 930.730361595), (24.727790343, 931.705822044), (26.698417514, 926.038668565), align=None)
    extrude(amount=BOSS_EXTRUDE18_DEPTH)


with BuildPart() as cut_extrude11_piece_2_1:
    add(cut_extrude11_piece_2.part)

    # Cut-Extrude12: cut by cut_extrude12_tool
    add(cut_extrude12_tool.part, mode=Mode.SUBTRACT)


with BuildPart() as body_3:
    # Mirror1: mirrored copy
    add(cut_extrude11_piece_1_1.part.mirror(Plane(origin=(0, -9, 0), x_dir=(0, 0, 1), z_dir=(0, -1, 0))))

    # Sketch46 → Boss-Extrude19 (add)
    with BuildSketch(Plane.ZY.offset(46.796128585)):
        with Locations((966.376354464, -16.5)):
            Rectangle(SKETCH46_W, SKETCH46_H)
    extrude(amount=BOSS_EXTRUDE19_DEPTH)

    # Sketch48 → Boss-Extrude20 (add)
    with BuildSketch(Plane(origin=(0, -15, 0), x_dir=(1, 0, 0), z_dir=(0, 1, 0))):
        with Locations((-48.296128585, -966.376354464)):
            Rectangle(SKETCH48_W, SKETCH48_H)
    extrude(amount=BOSS_EXTRUDE20_DEPTH)

    # Sketch50 → Boss-Extrude22 (add, two sides: drawn at the far end of the back side and taken through both)
    with BuildSketch(Plane(origin=(-46.796128585, 0, 0), x_dir=(0, 0, -1), z_dir=(1, 0, 0)).offset(-BOSS_EXTRUDE22_DEPTH_BACK)):
        with Locations((-959.866354464, 4.6)):
            Rectangle(SKETCH50_W, SKETCH50_H)
    extrude(amount=BOSS_EXTRUDE22_DEPTH + BOSS_EXTRUDE22_DEPTH_BACK)

    # Sketch51 → Cut-Extrude21 (cut)
    with BuildSketch(Plane(origin=(0, 6.1, 0), x_dir=(1, 0, 0), z_dir=(0, 1, 0))):
        with Locations(Location((-37.42112854, -959.066354487, 0), (0, 0, 270))):
            Circle(SKETCH51_R)
        with Locations(Location((-27.07112854, -959.066354497, 0), (0, 0, 270))):
            Circle(SKETCH51_R)
    extrude(amount=-CUT_EXTRUDE21_DEPTH, mode=Mode.SUBTRACT)

    # Sketch56 → Cut-Extrude26 (cut)
    with BuildSketch(Plane(origin=(-283.207370923, 0, 814.451186581), x_dir=(-0.9445255798324892, 0, -0.32843786176703227), z_dir=(0.32843786176703227, 0, -0.9445255798324892))):
        with Locations((-299.444093473, -16.997098614)):
            Rectangle(SKETCH56_W, SKETCH56_H)
    extrude(amount=-CUT_EXTRUDE26_DEPTH, mode=Mode.SUBTRACT)

    # Fillet4: read off the stored shape, not the designer's step
    # Fillet4 outline → Fillet4 (cut)
    with BuildSketch(Plane(origin=(0, 0, 0), x_dir=(1, 0, 0), z_dir=(0, 1, 0)).offset(FILLET4_START)):
        with BuildLine():
            Line((11.815255904, -959.705697054), (11.918892326, -959.407658179))
            ThreePointArc((11.918892326, -959.407658179), (11.77847749, -959.744040081), (11.598302874, -960.060909482))
            add(Edge.make_bspline(
                [(11.825950039, -959.709415703), (11.712561825, -959.885676085), (11.598302874, -960.060909482)],
                knots=[0, 0, 0, 0.010500986, 0.010500986, 0.010500986], degree=2))
            Line((11.825950039, -959.709415703), (11.815255904, -959.705697054))
        make_face()
    extrude(amount=FILLET4_DEPTH, mode=Mode.SUBTRACT)


with BuildPart() as body_3_2:
    # Mirror2: mirrored copy
    add(body_3.part.mirror(Plane(origin=(-13.535575409, -18, 962.175671275), x_dir=(0, 0, 1), z_dir=(0, -1, 0))))

    # Sketch63 → Boss-Extrude28 (add)
    with BuildSketch(Plane(origin=(131.691734271, 0, 20.857921628), x_dir=(-0.15643446504022615, 0, 0.9876883405951385), z_dir=(-0.9876883405951385, 0, -0.15643446504022615))):
        with BuildLine():
            add(Edge.make_bspline(
                [(954.763151571, -21), (947.864577189, -21), (940.966002807, -21)],
                knots=[0, 0, 0, 1, 1, 1], degree=2))
            Line((940.966002807, -21), (940.966002807, -18))
            add(Edge.make_bspline(
                [(954.763151571, -18), (947.864577189, -18), (940.966002807, -18)],
                knots=[0, 0, 0, 1, 1, 1], degree=2))
            Line((954.763151571, -18), (954.763151571, -21))
        make_face()
    extrude(amount=BOSS_EXTRUDE28_DEPTH)

    # Sketch67 → Boss-Extrude29 (add)
    with BuildSketch(Plane(origin=(0, -18, 0), x_dir=(1, 0, 0), z_dir=(0, 1, 0))):
        Polygon((-15.715193551, -950.206220259), (-15.742698114, -950.123028585), (-15.497121464, -950.208422428), (-15.507778999, -950.239071497), align=None)
    extrude(amount=-BOSS_EXTRUDE29_DEPTH)

    # Sketch68 → Boss-Extrude30 (add, two sides: drawn at the far end of the back side and taken through both)
    with BuildSketch(Plane(origin=(-283.240214709, 0, 814.545639139), x_dir=(-0.9445255798324883, -3.1744861168227707e-15, -0.32843786176703493), z_dir=(0.32843786176703493, -9.129225613729643e-15, -0.9445255798324883)).offset(-BOSS_EXTRUDE30_DEPTH_BACK)):
        with Locations((-299.279194071, -19.5)):
            Rectangle(SKETCH68_W, SKETCH68_H)
    extrude(amount=BOSS_EXTRUDE30_DEPTH + BOSS_EXTRUDE30_DEPTH_BACK)

    # Sketch69 → Boss-Extrude31 (add)
    with BuildSketch(Plane(origin=(-283.207370923, 0, 814.451186581), x_dir=(-0.9445255798324895, 0, -0.32843786176703144), z_dir=(0.32843786176703144, 0, -0.9445255798324895))):
        with Locations((-324.403636468, -19.5)):
            Rectangle(SKETCH69_W, SKETCH69_H)
    extrude(amount=BOSS_EXTRUDE31_DEPTH)

    # Sketch70 → Boss-Extrude32 (add)
    with BuildSketch(Plane(origin=(308.258672657, 0, 107.190129606), x_dir=(0.3284378617670337, 0, -0.9445255798324887), z_dir=(0.9445255798324887, 0, 0.3284378617670337))):
        with Locations((-863.177220903, -19.5)):
            Rectangle(SKETCH70_W, SKETCH70_H)
    extrude(amount=BOSS_EXTRUDE32_DEPTH)

    # Sketch71 → Boss-Extrude33 (add)
    with BuildSketch(Plane.XZ.offset(21)):
        Polygon((28.589002033, 920.906174309), (26.792870072, 926.071512351), (24.05374589, 925.119042552), (25.841248137, 919.978521948), align=None)
    extrude(amount=BOSS_EXTRUDE33_DEPTH)

    # Sketch72 → Boss-Extrude34 (add)
    with BuildSketch(Plane(origin=(-282.606329636, 0, 812.722704769), x_dir=(-0.9445255798324861, 0, -0.3284378617670412), z_dir=(0.3284378617670412, 0, -0.9445255798324861))):
        with Locations((-328.0134985, -43.70328926)):
            Rectangle(SKETCH72_W, SKETCH72_H)
    extrude(amount=BOSS_EXTRUDE34_DEPTH)

    # Sketch73 → Boss-Extrude35 (add)
    with BuildSketch(Plane(origin=(308.447577773, 0, 107.255817179), x_dir=(-0.32843786176702733, 0, 0.9445255798324909), z_dir=(-0.944525579832491, 0, -0.32843786176702733))):
        with Locations((856.429727564, -43.70328926)):
            Rectangle(SKETCH73_W, SKETCH73_H)
    extrude(amount=BOSS_EXTRUDE35_DEPTH)

    # Sketch74 → Cut-Extrude27 (cut)
    with BuildSketch(Plane.XZ.offset(45.17)):
        with Locations(Location((18.400180873, 912.294602496, 0), (0, 0, 270))):
            Circle(SKETCH74_R)
        with Locations(Location((8.624341118, 908.895270636, 0), (0, 0, 270))):
            Circle(SKETCH74_R)
    extrude(amount=-CUT_EXTRUDE27_DEPTH, mode=Mode.SUBTRACT)


with BuildPart() as body_3_3:
    # Mirror3: read off the stored shape, not the designer's step
    # Mirror3: mirrored copy
    add(body_3_2.part.mirror(Plane(origin=(0, -42.1, 0), x_dir=(1, 0, 0), z_dir=(0, 1, 0))))


with BuildPart() as body_3_4:
    # Mirror4: read off the stored shape, not the designer's step
    # Mirror4: mirrored copy
    add(body_3_3.part.mirror(Plane(origin=(0, -42.1, 0), x_dir=(1, 0, 0), z_dir=(0, 1, 0))))

    # Sketch75 → Cut-Extrude28 (cut)
    with BuildSketch(Plane(origin=(278.112718549, 0, 96.707541395), x_dir=(-0.32843786176743106, 0, 0.9445255798323505), z_dir=(-0.9445255798323505, 0, -0.32843786176743106))):
        with Locations((868.450251665, -23.999675203)):
            Circle(SKETCH75_R)
    extrude(amount=-CUT_EXTRUDE28_DEPTH, mode=Mode.SUBTRACT)

    # Sketch76 → Cut-Extrude29 (cut)
    with BuildSketch(Plane(origin=(311.092249396, 0, 108.175443191), x_dir=(0.32843786176703343, 0, -0.9445255798324887), z_dir=(0.9445255798324889, 0, 0.3284378617670335))):
        with Locations(Location((-868.450251635, -23.999675203, 0), (0, 0, 180))):
            Circle(SKETCH76_R)
    extrude(amount=-CUT_EXTRUDE29_DEPTH, mode=Mode.SUBTRACT)

    # Sketch77 → Boss-Extrude36 (add)
    with BuildSketch(Plane(origin=(0, -18, 0), x_dir=(1, 0, 0), z_dir=(0, 1, 0))):
        with BuildLine():
            Line((-39.266128585, -975.05646378), (-39.865804676, -988.183184315))
            ThreePointArc((-39.865804676, -988.183184315), (-31.795966631, -983.287739608), (-23.726128585, -988.183184315))
            Line((-23.726128585, -988.183184315), (-24.266128585, -978.146354464))
            Line((-24.266128585, -978.146354464), (-24.302851007, -978.146354464))
            Line((-24.302851007, -978.146354464), (-24.308019321, -978.056409122))
            Line((-24.308019321, -978.056409122), (-39.266128585, -975.05646378))
        make_face()
    extrude(amount=-BOSS_EXTRUDE36_DEPTH)

    # Sketch78 → Boss-Extrude37 (add)
    with BuildSketch(Plane(origin=(0, -18, 0), x_dir=(1, 0, 0), z_dir=(0, 1, 0))):
        with BuildLine():
            ThreePointArc((18.196018618, -929.421375958), (4.999614304, -935.398306421), (-1.641457655, -922.52333272))
            Line((-1.641457655, -922.52333272), (-6.699400727, -937.069026653))
            Line((-6.699400727, -937.069026653), (11.67040627, -948.187810964))
            Line((11.67040627, -948.187810964), (18.196018618, -929.421375958))
        make_face()
    extrude(amount=-BOSS_EXTRUDE37_DEPTH)

    # Sketch79 → Cut-Extrude30 (cut)
    with BuildSketch(Plane(origin=(0, -18, 0), x_dir=(1, 0, 0), z_dir=(0, 1, 0))):
        with Locations((-32.334835861, -972.368141655)):
            Rectangle(SKETCH79_W, SKETCH79_H)
        Polygon((-2.641576394, -944.743524907), (1.140719159, -946.045154788), (4.923014713, -947.346784669), (5.899237123, -944.510063004), (-1.665353983, -941.906803242), align=None)
    extrude(amount=-CUT_EXTRUDE30_DEPTH, mode=Mode.SUBTRACT)

    # Sketch84 → Cut-Extrude31 (cut)
    with BuildSketch(Plane(origin=(0, -18, 0), x_dir=(1, 0, 0), z_dir=(0, 1, 0))):
        Polygon((-7.631325194, -960.581359171), (-6.730087577, -957.719931073), (0.90038735, -960.123231383), (-0.000850266, -962.984659481), align=None)
    extrude(amount=-CUT_EXTRUDE31_DEPTH, mode=Mode.SUBTRACT)


solid = Compound([cut_extrude11_piece_2_1.part, body_3_4.part])
